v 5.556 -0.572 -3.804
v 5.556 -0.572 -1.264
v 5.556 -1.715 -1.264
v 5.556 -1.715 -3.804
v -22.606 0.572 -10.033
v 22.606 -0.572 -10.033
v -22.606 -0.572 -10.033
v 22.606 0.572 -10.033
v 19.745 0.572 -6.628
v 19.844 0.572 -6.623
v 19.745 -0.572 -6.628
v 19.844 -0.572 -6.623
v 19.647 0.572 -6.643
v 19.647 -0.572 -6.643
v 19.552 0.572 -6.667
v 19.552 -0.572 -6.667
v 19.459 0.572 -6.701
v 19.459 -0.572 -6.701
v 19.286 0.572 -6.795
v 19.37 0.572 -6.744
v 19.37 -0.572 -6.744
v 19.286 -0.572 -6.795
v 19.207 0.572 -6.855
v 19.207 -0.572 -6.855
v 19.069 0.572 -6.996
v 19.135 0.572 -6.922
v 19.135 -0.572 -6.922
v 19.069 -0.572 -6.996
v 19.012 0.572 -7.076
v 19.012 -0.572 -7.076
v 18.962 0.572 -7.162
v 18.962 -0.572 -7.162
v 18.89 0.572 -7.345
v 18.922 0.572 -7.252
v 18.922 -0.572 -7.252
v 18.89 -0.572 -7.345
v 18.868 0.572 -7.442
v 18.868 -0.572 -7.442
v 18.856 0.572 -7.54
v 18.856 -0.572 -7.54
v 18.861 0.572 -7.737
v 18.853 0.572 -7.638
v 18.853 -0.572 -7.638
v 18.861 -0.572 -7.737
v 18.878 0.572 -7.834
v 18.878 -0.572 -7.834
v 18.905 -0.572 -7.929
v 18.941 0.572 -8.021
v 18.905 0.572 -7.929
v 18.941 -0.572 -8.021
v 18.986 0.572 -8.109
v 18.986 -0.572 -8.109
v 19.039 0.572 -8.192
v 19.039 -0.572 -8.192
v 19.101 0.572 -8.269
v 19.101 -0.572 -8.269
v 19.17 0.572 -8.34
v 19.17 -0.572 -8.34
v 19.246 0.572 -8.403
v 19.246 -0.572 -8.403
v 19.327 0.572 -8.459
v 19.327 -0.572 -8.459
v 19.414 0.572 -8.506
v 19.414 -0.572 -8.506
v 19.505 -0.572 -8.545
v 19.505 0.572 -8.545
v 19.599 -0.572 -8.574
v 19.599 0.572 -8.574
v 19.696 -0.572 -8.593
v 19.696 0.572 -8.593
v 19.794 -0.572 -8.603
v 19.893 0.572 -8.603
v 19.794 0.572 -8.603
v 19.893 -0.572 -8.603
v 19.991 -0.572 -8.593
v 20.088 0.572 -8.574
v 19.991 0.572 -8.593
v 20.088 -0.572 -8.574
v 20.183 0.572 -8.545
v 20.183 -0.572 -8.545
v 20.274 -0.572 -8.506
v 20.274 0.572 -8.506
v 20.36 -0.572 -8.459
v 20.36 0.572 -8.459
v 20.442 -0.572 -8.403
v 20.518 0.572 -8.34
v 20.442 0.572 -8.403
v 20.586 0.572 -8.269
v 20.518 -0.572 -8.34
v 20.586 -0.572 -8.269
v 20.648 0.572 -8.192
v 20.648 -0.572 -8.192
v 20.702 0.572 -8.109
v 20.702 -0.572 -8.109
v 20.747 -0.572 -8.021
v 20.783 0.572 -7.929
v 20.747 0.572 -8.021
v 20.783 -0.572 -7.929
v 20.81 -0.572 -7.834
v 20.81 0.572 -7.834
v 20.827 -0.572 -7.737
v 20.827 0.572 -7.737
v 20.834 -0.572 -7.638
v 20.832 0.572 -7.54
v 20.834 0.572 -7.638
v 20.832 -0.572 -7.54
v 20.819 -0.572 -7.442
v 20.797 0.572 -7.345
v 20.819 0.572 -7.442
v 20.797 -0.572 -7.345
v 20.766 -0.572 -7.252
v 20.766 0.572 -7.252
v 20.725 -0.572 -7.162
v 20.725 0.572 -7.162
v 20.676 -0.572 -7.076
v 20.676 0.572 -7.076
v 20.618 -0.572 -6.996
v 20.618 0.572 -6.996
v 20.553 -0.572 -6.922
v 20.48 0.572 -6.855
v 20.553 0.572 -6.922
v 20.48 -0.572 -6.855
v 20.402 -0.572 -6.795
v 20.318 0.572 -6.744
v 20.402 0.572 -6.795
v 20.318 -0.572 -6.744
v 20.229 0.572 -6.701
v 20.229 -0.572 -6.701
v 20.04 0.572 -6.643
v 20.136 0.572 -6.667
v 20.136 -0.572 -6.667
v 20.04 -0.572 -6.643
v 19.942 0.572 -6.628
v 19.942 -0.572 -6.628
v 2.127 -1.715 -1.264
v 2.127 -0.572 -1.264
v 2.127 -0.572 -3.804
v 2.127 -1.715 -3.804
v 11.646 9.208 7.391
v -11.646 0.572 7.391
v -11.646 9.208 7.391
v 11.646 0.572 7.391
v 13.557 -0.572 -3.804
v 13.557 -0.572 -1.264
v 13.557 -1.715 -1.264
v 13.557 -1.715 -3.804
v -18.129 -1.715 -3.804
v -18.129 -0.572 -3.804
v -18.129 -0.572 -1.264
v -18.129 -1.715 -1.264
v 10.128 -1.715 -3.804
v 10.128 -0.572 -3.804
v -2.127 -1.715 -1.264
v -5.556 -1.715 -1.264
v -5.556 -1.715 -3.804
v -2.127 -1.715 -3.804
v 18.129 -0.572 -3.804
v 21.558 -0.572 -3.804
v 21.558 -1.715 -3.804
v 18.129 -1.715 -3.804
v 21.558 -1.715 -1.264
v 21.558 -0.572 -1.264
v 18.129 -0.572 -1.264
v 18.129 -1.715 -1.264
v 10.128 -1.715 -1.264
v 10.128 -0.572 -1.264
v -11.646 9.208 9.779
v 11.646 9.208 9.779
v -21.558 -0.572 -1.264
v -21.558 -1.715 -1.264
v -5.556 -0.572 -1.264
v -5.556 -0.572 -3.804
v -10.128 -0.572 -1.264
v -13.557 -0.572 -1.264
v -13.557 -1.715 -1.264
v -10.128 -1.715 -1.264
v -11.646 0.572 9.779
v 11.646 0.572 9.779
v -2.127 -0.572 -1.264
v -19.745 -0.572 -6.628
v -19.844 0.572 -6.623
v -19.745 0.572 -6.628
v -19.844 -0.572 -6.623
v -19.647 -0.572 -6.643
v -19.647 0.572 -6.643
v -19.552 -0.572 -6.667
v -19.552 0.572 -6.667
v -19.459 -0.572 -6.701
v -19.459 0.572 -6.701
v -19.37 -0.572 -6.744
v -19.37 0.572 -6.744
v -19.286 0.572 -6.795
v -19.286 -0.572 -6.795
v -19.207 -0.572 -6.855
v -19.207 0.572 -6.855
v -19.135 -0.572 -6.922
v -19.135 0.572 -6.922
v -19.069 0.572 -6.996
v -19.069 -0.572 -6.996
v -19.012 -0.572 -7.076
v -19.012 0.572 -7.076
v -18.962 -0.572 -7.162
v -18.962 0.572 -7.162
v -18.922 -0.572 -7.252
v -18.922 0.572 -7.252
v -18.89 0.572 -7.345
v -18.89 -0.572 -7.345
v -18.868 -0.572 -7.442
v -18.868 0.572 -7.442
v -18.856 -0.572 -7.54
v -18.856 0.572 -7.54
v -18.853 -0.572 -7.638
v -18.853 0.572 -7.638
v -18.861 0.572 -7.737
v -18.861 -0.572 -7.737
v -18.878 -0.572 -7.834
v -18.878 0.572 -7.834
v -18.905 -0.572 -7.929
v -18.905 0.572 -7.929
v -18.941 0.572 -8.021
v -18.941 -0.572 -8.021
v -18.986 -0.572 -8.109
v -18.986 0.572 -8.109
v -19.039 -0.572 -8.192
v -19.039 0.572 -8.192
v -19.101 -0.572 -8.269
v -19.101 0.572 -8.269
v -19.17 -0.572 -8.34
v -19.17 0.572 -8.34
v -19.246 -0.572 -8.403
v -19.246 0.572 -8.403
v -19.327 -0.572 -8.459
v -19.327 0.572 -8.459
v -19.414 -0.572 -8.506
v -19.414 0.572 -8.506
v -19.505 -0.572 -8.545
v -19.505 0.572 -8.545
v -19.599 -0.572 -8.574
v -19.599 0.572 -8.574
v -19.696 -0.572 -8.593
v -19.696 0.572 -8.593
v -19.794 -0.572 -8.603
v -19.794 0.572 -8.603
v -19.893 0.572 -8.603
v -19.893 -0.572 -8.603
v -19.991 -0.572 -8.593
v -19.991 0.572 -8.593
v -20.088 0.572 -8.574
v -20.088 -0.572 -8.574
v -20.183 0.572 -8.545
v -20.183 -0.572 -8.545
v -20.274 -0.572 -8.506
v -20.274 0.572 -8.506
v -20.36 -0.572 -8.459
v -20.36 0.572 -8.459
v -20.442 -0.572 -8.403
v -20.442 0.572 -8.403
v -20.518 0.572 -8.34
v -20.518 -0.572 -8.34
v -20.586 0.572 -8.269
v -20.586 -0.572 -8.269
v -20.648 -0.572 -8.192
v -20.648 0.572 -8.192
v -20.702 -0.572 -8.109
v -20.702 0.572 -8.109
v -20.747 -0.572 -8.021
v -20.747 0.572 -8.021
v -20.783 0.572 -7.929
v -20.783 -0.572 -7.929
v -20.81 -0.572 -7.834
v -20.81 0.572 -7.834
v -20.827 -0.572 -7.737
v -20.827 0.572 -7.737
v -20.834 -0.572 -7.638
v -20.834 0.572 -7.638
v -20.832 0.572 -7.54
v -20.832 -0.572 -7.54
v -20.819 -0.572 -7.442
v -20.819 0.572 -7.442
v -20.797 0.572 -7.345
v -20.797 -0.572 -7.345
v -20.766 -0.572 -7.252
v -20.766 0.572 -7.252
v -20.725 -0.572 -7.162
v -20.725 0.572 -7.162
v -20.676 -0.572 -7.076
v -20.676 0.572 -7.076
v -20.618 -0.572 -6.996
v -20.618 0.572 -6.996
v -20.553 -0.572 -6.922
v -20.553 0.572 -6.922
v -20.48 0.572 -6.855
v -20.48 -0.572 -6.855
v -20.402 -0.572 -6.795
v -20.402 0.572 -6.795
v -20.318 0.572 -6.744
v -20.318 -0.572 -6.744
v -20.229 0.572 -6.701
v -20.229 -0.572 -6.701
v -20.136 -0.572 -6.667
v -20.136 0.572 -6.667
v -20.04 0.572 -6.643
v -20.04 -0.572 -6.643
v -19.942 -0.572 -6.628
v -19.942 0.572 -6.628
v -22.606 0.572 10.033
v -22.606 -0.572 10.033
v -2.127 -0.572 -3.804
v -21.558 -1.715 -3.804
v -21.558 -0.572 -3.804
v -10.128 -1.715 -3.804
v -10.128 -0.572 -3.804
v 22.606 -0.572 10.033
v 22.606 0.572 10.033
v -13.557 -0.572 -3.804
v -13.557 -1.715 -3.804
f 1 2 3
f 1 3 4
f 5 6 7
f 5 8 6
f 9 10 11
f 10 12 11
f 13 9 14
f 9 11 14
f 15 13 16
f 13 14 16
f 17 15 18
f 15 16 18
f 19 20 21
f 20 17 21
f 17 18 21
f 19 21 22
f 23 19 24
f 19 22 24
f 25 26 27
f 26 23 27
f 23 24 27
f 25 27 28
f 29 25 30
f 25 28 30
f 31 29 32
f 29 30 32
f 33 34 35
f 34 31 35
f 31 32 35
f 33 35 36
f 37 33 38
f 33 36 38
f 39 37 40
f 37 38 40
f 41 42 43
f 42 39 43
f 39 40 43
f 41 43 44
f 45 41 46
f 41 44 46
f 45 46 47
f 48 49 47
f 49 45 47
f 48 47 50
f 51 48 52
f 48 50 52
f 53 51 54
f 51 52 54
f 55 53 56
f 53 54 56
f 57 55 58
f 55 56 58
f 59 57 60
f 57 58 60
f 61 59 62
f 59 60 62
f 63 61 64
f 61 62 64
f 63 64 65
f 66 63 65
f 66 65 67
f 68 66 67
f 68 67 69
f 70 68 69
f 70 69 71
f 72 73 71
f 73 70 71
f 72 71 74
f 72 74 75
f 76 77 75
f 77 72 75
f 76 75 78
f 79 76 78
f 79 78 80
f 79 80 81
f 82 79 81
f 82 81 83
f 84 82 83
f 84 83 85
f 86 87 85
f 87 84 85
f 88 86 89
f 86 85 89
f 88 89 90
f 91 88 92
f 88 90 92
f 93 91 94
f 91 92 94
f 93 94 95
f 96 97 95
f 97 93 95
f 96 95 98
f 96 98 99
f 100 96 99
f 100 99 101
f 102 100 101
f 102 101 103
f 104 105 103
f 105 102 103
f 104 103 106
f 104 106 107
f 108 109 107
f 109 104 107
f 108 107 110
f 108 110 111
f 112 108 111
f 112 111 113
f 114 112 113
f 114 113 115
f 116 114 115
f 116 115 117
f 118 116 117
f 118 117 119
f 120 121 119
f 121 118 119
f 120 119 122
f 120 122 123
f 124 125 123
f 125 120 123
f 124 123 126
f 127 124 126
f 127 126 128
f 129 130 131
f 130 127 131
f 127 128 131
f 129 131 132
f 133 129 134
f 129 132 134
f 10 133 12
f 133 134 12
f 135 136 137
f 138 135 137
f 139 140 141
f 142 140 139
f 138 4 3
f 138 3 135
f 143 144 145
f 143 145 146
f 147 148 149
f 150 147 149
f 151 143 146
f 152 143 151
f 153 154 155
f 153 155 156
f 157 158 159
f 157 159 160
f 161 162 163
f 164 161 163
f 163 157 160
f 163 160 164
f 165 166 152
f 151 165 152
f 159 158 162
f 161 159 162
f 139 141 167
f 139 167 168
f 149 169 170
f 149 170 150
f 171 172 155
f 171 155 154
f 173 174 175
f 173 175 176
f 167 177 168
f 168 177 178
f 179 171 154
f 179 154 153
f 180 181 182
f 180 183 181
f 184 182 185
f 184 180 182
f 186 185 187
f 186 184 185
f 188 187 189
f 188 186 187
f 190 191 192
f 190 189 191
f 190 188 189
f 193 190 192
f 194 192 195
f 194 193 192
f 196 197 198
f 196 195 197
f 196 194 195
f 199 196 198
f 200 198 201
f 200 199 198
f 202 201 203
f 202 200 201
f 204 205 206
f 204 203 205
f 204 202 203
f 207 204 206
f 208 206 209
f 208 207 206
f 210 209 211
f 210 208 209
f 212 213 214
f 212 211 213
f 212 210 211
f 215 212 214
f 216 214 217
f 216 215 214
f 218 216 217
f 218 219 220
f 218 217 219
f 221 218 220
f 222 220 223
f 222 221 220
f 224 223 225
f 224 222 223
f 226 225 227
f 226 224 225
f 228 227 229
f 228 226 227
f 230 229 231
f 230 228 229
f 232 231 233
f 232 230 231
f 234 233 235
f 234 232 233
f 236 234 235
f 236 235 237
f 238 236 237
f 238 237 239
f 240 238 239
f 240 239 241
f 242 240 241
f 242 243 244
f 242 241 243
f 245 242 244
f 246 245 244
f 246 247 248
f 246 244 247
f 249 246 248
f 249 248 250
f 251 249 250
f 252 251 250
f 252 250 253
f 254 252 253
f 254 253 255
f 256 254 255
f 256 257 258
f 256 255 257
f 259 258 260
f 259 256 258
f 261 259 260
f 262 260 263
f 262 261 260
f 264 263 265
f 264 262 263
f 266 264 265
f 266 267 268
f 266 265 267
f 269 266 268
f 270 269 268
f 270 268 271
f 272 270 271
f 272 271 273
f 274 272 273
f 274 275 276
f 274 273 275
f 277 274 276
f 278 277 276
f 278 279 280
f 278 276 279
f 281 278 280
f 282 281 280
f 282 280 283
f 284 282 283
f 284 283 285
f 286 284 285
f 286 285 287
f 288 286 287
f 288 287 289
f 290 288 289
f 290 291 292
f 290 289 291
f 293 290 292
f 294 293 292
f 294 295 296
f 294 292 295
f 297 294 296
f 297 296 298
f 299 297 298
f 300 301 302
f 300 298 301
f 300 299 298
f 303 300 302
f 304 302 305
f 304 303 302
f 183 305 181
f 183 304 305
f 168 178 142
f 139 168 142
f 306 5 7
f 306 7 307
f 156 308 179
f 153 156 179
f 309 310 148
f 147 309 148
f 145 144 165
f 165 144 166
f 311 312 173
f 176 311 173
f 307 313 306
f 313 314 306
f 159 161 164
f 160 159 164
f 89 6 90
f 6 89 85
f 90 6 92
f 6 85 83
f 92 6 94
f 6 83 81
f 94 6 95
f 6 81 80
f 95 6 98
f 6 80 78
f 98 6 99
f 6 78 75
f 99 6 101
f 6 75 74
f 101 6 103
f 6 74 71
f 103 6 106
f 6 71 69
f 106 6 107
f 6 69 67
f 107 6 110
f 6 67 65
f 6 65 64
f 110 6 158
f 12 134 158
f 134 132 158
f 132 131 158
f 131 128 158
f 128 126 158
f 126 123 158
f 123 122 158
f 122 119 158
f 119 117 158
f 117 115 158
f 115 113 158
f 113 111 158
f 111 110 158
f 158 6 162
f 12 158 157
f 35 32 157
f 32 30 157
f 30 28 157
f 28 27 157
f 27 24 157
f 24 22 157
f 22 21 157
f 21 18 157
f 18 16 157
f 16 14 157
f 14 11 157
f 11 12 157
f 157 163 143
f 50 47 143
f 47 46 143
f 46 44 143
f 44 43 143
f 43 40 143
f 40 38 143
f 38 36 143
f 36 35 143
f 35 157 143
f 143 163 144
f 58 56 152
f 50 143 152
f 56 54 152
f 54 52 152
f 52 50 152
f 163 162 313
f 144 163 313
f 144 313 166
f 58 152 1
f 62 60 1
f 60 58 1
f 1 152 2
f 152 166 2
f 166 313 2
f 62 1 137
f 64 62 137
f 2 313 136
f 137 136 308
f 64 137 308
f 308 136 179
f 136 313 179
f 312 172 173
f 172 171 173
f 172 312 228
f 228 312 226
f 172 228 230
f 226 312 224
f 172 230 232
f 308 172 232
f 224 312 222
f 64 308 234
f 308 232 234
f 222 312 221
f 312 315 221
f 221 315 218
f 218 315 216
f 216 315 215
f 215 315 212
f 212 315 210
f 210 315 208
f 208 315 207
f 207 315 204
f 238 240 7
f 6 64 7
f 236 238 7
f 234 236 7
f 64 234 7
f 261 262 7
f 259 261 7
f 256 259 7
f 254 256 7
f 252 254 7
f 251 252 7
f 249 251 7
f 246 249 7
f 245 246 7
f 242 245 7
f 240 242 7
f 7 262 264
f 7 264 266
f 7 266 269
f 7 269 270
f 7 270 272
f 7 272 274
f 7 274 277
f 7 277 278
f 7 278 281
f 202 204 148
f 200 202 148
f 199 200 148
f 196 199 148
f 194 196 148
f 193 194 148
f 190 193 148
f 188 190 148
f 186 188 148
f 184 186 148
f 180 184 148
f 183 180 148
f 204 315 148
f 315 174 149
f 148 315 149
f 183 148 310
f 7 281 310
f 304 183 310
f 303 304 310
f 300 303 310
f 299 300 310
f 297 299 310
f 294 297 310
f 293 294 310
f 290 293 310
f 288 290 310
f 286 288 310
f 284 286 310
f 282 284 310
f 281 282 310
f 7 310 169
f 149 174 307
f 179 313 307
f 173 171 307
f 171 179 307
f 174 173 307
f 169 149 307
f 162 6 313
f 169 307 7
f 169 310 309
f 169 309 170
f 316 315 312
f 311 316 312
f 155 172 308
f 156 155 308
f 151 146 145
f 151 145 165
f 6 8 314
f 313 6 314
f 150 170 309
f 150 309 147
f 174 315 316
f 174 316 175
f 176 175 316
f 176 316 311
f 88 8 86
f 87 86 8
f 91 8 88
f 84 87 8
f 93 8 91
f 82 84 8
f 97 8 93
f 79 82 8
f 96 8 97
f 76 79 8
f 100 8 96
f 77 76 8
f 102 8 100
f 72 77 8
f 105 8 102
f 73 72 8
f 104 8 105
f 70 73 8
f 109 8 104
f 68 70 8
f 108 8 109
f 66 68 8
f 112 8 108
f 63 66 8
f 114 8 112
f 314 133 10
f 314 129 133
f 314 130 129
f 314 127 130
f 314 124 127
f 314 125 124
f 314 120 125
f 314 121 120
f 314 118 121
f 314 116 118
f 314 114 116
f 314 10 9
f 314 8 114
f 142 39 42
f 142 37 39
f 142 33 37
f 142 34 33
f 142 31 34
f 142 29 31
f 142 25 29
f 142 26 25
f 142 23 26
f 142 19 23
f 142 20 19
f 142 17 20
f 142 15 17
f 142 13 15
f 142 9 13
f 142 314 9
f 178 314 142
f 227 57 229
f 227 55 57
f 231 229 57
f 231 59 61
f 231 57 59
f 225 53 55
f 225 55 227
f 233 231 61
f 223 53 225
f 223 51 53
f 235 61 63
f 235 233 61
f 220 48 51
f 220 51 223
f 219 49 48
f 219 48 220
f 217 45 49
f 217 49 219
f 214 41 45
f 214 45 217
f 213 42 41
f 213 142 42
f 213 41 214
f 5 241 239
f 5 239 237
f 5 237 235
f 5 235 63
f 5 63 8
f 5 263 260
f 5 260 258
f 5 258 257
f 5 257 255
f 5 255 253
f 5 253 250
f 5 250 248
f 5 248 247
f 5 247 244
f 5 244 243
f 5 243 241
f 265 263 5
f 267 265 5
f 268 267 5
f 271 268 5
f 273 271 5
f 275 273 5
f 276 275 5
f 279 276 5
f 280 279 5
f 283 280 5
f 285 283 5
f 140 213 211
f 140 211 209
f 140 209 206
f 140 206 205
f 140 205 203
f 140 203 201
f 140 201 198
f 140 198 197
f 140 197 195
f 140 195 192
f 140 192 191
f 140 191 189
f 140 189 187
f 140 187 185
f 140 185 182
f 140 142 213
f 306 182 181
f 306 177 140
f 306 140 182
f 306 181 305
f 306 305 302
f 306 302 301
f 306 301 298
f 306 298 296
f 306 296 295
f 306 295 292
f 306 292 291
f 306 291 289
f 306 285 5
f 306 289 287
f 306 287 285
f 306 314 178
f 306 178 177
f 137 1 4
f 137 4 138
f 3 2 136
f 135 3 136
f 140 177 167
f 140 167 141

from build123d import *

# Parameters (mm, degrees)
SKETCH1_W               = 22.606
SKETCH1_H               = 10.033
BOSS_EXTRUDE1_DEPTH     = 0.5715
CUT_EXTRUDE1_DEPTH      = 25.758812047
CUT_EXTRUDE1_DEPTH_BACK = 25.758812047
SKETCH2_R               = 0.9906
SKETCH3_W               = 23.2918
SKETCH3_H               = 2.3876
BOSS_EXTRUDE2_DEPTH     = 8.636
SKETCH4_W               = 3.429
SKETCH4_H               = 2.54
BOSS_EXTRUDE3_DEPTH     = 1.143
LPATTERN1_COUNT         = 3
LPATTERN1_PITCH         = 8.001
MIRROR4_COPY_1_SKETCH_W = 3.429
MIRROR4_COPY_1_SKETCH_H = 2.54
MIRROR4_COPY_1_DEPTH    = 1.143
MIRROR4_COPY_2_SKETCH_W = 3.429
MIRROR4_COPY_2_SKETCH_H = 2.54
MIRROR4_COPY_2_DEPTH    = 1.143
MIRROR4_COPY_3_SKETCH_W = 3.429
MIRROR4_COPY_3_SKETCH_H = 2.54
MIRROR4_COPY_3_DEPTH    = 1.143


with BuildPart() as part:
    # Sketch1 → Boss-Extrude1 (new, symmetric)
    with BuildSketch(Plane(origin=(0, 0, 0), x_dir=(1, 0, 0), z_dir=(0, 1, 0))):
        with Locations((-11.303, 5.0165)):
            Rectangle(SKETCH1_W, SKETCH1_H)
    boss_extrude1 = extrude(amount=BOSS_EXTRUDE1_DEPTH, both=True)

    # Mirror1: Boss-Extrude1 across plane
    add(boss_extrude1.mirror(Plane(origin=(0, 0.5715, 0), x_dir=(1, 0, 0), z_dir=(0, 0, -1))))

    # Sketch2 → Cut-Extrude1 (cut, two sides: drawn at the far end of the back side and taken through both)
    with BuildSketch(Plane(origin=(0, 0.5715, 0), x_dir=(1, 0, 0), z_dir=(0, 1, 0)).offset(-CUT_EXTRUDE1_DEPTH_BACK)):
        with Locations((-19.84375, 7.61365)):
            Circle(SKETCH2_R)
    extrude(amount=CUT_EXTRUDE1_DEPTH + CUT_EXTRUDE1_DEPTH_BACK, mode=Mode.SUBTRACT)

    # Mirror3: part across plane


with BuildPart() as part_1:
    add(part.part)
    add(part.part.mirror(Plane(origin=(0, 0, 0), x_dir=(0, 0, 1), z_dir=(1, 0, 0))))

    # Sketch3 → Boss-Extrude2 (add)
    with BuildSketch(Plane(origin=(0, 0.5715, 0), x_dir=(1, 0, 0), z_dir=(0, 1, 0))):
        with Locations((0, -8.5852)):
            Rectangle(SKETCH3_W, SKETCH3_H)
    extrude(amount=BOSS_EXTRUDE2_DEPTH)

    # Sketch4 → Boss-Extrude3 (add)
    with BuildSketch(Plane.XZ.offset(0.5715)):
        with Locations((-19.84375, -2.53365)):
            Rectangle(SKETCH4_W, SKETCH4_H)
    boss_extrude3 = extrude(amount=BOSS_EXTRUDE3_DEPTH)

    # LPattern1: Boss-Extrude3 ×3
    with Locations(*[(i * LPATTERN1_PITCH, 0, 0) for i in range(1, LPATTERN1_COUNT)]):
        add(boss_extrude3)

    # Mirror4 copy 1 sketch → Mirror4 copy 1 (add)
    with BuildSketch(Plane(origin=(-8.001, -0.5715, 0), x_dir=(-1, 0, 0), z_dir=(0, -1, 0))):
        with Locations((-19.84375, 2.53365)):
            Rectangle(MIRROR4_COPY_1_SKETCH_W, MIRROR4_COPY_1_SKETCH_H)
    extrude(amount=MIRROR4_COPY_1_DEPTH)

    # Mirror4 copy 2 sketch → Mirror4 copy 2 (add)
    with BuildSketch(Plane(origin=(-16.002, -0.5715, 0), x_dir=(-1, 0, 0), z_dir=(0, -1, 0))):
        with Locations((-19.84375, 2.53365)):
            Rectangle(MIRROR4_COPY_2_SKETCH_W, MIRROR4_COPY_2_SKETCH_H)
    extrude(amount=MIRROR4_COPY_2_DEPTH)

    # Mirror4 copy 3 sketch → Mirror4 copy 3 (add)
    with BuildSketch(Plane(origin=(0, -0.5715, 0), x_dir=(-1, 0, 0), z_dir=(0, -1, 0))):
        with Locations((-19.84375, 2.53365)):
            Rectangle(MIRROR4_COPY_3_SKETCH_W, MIRROR4_COPY_3_SKETCH_H)
    extrude(amount=MIRROR4_COPY_3_DEPTH)


solid = part_1.part
